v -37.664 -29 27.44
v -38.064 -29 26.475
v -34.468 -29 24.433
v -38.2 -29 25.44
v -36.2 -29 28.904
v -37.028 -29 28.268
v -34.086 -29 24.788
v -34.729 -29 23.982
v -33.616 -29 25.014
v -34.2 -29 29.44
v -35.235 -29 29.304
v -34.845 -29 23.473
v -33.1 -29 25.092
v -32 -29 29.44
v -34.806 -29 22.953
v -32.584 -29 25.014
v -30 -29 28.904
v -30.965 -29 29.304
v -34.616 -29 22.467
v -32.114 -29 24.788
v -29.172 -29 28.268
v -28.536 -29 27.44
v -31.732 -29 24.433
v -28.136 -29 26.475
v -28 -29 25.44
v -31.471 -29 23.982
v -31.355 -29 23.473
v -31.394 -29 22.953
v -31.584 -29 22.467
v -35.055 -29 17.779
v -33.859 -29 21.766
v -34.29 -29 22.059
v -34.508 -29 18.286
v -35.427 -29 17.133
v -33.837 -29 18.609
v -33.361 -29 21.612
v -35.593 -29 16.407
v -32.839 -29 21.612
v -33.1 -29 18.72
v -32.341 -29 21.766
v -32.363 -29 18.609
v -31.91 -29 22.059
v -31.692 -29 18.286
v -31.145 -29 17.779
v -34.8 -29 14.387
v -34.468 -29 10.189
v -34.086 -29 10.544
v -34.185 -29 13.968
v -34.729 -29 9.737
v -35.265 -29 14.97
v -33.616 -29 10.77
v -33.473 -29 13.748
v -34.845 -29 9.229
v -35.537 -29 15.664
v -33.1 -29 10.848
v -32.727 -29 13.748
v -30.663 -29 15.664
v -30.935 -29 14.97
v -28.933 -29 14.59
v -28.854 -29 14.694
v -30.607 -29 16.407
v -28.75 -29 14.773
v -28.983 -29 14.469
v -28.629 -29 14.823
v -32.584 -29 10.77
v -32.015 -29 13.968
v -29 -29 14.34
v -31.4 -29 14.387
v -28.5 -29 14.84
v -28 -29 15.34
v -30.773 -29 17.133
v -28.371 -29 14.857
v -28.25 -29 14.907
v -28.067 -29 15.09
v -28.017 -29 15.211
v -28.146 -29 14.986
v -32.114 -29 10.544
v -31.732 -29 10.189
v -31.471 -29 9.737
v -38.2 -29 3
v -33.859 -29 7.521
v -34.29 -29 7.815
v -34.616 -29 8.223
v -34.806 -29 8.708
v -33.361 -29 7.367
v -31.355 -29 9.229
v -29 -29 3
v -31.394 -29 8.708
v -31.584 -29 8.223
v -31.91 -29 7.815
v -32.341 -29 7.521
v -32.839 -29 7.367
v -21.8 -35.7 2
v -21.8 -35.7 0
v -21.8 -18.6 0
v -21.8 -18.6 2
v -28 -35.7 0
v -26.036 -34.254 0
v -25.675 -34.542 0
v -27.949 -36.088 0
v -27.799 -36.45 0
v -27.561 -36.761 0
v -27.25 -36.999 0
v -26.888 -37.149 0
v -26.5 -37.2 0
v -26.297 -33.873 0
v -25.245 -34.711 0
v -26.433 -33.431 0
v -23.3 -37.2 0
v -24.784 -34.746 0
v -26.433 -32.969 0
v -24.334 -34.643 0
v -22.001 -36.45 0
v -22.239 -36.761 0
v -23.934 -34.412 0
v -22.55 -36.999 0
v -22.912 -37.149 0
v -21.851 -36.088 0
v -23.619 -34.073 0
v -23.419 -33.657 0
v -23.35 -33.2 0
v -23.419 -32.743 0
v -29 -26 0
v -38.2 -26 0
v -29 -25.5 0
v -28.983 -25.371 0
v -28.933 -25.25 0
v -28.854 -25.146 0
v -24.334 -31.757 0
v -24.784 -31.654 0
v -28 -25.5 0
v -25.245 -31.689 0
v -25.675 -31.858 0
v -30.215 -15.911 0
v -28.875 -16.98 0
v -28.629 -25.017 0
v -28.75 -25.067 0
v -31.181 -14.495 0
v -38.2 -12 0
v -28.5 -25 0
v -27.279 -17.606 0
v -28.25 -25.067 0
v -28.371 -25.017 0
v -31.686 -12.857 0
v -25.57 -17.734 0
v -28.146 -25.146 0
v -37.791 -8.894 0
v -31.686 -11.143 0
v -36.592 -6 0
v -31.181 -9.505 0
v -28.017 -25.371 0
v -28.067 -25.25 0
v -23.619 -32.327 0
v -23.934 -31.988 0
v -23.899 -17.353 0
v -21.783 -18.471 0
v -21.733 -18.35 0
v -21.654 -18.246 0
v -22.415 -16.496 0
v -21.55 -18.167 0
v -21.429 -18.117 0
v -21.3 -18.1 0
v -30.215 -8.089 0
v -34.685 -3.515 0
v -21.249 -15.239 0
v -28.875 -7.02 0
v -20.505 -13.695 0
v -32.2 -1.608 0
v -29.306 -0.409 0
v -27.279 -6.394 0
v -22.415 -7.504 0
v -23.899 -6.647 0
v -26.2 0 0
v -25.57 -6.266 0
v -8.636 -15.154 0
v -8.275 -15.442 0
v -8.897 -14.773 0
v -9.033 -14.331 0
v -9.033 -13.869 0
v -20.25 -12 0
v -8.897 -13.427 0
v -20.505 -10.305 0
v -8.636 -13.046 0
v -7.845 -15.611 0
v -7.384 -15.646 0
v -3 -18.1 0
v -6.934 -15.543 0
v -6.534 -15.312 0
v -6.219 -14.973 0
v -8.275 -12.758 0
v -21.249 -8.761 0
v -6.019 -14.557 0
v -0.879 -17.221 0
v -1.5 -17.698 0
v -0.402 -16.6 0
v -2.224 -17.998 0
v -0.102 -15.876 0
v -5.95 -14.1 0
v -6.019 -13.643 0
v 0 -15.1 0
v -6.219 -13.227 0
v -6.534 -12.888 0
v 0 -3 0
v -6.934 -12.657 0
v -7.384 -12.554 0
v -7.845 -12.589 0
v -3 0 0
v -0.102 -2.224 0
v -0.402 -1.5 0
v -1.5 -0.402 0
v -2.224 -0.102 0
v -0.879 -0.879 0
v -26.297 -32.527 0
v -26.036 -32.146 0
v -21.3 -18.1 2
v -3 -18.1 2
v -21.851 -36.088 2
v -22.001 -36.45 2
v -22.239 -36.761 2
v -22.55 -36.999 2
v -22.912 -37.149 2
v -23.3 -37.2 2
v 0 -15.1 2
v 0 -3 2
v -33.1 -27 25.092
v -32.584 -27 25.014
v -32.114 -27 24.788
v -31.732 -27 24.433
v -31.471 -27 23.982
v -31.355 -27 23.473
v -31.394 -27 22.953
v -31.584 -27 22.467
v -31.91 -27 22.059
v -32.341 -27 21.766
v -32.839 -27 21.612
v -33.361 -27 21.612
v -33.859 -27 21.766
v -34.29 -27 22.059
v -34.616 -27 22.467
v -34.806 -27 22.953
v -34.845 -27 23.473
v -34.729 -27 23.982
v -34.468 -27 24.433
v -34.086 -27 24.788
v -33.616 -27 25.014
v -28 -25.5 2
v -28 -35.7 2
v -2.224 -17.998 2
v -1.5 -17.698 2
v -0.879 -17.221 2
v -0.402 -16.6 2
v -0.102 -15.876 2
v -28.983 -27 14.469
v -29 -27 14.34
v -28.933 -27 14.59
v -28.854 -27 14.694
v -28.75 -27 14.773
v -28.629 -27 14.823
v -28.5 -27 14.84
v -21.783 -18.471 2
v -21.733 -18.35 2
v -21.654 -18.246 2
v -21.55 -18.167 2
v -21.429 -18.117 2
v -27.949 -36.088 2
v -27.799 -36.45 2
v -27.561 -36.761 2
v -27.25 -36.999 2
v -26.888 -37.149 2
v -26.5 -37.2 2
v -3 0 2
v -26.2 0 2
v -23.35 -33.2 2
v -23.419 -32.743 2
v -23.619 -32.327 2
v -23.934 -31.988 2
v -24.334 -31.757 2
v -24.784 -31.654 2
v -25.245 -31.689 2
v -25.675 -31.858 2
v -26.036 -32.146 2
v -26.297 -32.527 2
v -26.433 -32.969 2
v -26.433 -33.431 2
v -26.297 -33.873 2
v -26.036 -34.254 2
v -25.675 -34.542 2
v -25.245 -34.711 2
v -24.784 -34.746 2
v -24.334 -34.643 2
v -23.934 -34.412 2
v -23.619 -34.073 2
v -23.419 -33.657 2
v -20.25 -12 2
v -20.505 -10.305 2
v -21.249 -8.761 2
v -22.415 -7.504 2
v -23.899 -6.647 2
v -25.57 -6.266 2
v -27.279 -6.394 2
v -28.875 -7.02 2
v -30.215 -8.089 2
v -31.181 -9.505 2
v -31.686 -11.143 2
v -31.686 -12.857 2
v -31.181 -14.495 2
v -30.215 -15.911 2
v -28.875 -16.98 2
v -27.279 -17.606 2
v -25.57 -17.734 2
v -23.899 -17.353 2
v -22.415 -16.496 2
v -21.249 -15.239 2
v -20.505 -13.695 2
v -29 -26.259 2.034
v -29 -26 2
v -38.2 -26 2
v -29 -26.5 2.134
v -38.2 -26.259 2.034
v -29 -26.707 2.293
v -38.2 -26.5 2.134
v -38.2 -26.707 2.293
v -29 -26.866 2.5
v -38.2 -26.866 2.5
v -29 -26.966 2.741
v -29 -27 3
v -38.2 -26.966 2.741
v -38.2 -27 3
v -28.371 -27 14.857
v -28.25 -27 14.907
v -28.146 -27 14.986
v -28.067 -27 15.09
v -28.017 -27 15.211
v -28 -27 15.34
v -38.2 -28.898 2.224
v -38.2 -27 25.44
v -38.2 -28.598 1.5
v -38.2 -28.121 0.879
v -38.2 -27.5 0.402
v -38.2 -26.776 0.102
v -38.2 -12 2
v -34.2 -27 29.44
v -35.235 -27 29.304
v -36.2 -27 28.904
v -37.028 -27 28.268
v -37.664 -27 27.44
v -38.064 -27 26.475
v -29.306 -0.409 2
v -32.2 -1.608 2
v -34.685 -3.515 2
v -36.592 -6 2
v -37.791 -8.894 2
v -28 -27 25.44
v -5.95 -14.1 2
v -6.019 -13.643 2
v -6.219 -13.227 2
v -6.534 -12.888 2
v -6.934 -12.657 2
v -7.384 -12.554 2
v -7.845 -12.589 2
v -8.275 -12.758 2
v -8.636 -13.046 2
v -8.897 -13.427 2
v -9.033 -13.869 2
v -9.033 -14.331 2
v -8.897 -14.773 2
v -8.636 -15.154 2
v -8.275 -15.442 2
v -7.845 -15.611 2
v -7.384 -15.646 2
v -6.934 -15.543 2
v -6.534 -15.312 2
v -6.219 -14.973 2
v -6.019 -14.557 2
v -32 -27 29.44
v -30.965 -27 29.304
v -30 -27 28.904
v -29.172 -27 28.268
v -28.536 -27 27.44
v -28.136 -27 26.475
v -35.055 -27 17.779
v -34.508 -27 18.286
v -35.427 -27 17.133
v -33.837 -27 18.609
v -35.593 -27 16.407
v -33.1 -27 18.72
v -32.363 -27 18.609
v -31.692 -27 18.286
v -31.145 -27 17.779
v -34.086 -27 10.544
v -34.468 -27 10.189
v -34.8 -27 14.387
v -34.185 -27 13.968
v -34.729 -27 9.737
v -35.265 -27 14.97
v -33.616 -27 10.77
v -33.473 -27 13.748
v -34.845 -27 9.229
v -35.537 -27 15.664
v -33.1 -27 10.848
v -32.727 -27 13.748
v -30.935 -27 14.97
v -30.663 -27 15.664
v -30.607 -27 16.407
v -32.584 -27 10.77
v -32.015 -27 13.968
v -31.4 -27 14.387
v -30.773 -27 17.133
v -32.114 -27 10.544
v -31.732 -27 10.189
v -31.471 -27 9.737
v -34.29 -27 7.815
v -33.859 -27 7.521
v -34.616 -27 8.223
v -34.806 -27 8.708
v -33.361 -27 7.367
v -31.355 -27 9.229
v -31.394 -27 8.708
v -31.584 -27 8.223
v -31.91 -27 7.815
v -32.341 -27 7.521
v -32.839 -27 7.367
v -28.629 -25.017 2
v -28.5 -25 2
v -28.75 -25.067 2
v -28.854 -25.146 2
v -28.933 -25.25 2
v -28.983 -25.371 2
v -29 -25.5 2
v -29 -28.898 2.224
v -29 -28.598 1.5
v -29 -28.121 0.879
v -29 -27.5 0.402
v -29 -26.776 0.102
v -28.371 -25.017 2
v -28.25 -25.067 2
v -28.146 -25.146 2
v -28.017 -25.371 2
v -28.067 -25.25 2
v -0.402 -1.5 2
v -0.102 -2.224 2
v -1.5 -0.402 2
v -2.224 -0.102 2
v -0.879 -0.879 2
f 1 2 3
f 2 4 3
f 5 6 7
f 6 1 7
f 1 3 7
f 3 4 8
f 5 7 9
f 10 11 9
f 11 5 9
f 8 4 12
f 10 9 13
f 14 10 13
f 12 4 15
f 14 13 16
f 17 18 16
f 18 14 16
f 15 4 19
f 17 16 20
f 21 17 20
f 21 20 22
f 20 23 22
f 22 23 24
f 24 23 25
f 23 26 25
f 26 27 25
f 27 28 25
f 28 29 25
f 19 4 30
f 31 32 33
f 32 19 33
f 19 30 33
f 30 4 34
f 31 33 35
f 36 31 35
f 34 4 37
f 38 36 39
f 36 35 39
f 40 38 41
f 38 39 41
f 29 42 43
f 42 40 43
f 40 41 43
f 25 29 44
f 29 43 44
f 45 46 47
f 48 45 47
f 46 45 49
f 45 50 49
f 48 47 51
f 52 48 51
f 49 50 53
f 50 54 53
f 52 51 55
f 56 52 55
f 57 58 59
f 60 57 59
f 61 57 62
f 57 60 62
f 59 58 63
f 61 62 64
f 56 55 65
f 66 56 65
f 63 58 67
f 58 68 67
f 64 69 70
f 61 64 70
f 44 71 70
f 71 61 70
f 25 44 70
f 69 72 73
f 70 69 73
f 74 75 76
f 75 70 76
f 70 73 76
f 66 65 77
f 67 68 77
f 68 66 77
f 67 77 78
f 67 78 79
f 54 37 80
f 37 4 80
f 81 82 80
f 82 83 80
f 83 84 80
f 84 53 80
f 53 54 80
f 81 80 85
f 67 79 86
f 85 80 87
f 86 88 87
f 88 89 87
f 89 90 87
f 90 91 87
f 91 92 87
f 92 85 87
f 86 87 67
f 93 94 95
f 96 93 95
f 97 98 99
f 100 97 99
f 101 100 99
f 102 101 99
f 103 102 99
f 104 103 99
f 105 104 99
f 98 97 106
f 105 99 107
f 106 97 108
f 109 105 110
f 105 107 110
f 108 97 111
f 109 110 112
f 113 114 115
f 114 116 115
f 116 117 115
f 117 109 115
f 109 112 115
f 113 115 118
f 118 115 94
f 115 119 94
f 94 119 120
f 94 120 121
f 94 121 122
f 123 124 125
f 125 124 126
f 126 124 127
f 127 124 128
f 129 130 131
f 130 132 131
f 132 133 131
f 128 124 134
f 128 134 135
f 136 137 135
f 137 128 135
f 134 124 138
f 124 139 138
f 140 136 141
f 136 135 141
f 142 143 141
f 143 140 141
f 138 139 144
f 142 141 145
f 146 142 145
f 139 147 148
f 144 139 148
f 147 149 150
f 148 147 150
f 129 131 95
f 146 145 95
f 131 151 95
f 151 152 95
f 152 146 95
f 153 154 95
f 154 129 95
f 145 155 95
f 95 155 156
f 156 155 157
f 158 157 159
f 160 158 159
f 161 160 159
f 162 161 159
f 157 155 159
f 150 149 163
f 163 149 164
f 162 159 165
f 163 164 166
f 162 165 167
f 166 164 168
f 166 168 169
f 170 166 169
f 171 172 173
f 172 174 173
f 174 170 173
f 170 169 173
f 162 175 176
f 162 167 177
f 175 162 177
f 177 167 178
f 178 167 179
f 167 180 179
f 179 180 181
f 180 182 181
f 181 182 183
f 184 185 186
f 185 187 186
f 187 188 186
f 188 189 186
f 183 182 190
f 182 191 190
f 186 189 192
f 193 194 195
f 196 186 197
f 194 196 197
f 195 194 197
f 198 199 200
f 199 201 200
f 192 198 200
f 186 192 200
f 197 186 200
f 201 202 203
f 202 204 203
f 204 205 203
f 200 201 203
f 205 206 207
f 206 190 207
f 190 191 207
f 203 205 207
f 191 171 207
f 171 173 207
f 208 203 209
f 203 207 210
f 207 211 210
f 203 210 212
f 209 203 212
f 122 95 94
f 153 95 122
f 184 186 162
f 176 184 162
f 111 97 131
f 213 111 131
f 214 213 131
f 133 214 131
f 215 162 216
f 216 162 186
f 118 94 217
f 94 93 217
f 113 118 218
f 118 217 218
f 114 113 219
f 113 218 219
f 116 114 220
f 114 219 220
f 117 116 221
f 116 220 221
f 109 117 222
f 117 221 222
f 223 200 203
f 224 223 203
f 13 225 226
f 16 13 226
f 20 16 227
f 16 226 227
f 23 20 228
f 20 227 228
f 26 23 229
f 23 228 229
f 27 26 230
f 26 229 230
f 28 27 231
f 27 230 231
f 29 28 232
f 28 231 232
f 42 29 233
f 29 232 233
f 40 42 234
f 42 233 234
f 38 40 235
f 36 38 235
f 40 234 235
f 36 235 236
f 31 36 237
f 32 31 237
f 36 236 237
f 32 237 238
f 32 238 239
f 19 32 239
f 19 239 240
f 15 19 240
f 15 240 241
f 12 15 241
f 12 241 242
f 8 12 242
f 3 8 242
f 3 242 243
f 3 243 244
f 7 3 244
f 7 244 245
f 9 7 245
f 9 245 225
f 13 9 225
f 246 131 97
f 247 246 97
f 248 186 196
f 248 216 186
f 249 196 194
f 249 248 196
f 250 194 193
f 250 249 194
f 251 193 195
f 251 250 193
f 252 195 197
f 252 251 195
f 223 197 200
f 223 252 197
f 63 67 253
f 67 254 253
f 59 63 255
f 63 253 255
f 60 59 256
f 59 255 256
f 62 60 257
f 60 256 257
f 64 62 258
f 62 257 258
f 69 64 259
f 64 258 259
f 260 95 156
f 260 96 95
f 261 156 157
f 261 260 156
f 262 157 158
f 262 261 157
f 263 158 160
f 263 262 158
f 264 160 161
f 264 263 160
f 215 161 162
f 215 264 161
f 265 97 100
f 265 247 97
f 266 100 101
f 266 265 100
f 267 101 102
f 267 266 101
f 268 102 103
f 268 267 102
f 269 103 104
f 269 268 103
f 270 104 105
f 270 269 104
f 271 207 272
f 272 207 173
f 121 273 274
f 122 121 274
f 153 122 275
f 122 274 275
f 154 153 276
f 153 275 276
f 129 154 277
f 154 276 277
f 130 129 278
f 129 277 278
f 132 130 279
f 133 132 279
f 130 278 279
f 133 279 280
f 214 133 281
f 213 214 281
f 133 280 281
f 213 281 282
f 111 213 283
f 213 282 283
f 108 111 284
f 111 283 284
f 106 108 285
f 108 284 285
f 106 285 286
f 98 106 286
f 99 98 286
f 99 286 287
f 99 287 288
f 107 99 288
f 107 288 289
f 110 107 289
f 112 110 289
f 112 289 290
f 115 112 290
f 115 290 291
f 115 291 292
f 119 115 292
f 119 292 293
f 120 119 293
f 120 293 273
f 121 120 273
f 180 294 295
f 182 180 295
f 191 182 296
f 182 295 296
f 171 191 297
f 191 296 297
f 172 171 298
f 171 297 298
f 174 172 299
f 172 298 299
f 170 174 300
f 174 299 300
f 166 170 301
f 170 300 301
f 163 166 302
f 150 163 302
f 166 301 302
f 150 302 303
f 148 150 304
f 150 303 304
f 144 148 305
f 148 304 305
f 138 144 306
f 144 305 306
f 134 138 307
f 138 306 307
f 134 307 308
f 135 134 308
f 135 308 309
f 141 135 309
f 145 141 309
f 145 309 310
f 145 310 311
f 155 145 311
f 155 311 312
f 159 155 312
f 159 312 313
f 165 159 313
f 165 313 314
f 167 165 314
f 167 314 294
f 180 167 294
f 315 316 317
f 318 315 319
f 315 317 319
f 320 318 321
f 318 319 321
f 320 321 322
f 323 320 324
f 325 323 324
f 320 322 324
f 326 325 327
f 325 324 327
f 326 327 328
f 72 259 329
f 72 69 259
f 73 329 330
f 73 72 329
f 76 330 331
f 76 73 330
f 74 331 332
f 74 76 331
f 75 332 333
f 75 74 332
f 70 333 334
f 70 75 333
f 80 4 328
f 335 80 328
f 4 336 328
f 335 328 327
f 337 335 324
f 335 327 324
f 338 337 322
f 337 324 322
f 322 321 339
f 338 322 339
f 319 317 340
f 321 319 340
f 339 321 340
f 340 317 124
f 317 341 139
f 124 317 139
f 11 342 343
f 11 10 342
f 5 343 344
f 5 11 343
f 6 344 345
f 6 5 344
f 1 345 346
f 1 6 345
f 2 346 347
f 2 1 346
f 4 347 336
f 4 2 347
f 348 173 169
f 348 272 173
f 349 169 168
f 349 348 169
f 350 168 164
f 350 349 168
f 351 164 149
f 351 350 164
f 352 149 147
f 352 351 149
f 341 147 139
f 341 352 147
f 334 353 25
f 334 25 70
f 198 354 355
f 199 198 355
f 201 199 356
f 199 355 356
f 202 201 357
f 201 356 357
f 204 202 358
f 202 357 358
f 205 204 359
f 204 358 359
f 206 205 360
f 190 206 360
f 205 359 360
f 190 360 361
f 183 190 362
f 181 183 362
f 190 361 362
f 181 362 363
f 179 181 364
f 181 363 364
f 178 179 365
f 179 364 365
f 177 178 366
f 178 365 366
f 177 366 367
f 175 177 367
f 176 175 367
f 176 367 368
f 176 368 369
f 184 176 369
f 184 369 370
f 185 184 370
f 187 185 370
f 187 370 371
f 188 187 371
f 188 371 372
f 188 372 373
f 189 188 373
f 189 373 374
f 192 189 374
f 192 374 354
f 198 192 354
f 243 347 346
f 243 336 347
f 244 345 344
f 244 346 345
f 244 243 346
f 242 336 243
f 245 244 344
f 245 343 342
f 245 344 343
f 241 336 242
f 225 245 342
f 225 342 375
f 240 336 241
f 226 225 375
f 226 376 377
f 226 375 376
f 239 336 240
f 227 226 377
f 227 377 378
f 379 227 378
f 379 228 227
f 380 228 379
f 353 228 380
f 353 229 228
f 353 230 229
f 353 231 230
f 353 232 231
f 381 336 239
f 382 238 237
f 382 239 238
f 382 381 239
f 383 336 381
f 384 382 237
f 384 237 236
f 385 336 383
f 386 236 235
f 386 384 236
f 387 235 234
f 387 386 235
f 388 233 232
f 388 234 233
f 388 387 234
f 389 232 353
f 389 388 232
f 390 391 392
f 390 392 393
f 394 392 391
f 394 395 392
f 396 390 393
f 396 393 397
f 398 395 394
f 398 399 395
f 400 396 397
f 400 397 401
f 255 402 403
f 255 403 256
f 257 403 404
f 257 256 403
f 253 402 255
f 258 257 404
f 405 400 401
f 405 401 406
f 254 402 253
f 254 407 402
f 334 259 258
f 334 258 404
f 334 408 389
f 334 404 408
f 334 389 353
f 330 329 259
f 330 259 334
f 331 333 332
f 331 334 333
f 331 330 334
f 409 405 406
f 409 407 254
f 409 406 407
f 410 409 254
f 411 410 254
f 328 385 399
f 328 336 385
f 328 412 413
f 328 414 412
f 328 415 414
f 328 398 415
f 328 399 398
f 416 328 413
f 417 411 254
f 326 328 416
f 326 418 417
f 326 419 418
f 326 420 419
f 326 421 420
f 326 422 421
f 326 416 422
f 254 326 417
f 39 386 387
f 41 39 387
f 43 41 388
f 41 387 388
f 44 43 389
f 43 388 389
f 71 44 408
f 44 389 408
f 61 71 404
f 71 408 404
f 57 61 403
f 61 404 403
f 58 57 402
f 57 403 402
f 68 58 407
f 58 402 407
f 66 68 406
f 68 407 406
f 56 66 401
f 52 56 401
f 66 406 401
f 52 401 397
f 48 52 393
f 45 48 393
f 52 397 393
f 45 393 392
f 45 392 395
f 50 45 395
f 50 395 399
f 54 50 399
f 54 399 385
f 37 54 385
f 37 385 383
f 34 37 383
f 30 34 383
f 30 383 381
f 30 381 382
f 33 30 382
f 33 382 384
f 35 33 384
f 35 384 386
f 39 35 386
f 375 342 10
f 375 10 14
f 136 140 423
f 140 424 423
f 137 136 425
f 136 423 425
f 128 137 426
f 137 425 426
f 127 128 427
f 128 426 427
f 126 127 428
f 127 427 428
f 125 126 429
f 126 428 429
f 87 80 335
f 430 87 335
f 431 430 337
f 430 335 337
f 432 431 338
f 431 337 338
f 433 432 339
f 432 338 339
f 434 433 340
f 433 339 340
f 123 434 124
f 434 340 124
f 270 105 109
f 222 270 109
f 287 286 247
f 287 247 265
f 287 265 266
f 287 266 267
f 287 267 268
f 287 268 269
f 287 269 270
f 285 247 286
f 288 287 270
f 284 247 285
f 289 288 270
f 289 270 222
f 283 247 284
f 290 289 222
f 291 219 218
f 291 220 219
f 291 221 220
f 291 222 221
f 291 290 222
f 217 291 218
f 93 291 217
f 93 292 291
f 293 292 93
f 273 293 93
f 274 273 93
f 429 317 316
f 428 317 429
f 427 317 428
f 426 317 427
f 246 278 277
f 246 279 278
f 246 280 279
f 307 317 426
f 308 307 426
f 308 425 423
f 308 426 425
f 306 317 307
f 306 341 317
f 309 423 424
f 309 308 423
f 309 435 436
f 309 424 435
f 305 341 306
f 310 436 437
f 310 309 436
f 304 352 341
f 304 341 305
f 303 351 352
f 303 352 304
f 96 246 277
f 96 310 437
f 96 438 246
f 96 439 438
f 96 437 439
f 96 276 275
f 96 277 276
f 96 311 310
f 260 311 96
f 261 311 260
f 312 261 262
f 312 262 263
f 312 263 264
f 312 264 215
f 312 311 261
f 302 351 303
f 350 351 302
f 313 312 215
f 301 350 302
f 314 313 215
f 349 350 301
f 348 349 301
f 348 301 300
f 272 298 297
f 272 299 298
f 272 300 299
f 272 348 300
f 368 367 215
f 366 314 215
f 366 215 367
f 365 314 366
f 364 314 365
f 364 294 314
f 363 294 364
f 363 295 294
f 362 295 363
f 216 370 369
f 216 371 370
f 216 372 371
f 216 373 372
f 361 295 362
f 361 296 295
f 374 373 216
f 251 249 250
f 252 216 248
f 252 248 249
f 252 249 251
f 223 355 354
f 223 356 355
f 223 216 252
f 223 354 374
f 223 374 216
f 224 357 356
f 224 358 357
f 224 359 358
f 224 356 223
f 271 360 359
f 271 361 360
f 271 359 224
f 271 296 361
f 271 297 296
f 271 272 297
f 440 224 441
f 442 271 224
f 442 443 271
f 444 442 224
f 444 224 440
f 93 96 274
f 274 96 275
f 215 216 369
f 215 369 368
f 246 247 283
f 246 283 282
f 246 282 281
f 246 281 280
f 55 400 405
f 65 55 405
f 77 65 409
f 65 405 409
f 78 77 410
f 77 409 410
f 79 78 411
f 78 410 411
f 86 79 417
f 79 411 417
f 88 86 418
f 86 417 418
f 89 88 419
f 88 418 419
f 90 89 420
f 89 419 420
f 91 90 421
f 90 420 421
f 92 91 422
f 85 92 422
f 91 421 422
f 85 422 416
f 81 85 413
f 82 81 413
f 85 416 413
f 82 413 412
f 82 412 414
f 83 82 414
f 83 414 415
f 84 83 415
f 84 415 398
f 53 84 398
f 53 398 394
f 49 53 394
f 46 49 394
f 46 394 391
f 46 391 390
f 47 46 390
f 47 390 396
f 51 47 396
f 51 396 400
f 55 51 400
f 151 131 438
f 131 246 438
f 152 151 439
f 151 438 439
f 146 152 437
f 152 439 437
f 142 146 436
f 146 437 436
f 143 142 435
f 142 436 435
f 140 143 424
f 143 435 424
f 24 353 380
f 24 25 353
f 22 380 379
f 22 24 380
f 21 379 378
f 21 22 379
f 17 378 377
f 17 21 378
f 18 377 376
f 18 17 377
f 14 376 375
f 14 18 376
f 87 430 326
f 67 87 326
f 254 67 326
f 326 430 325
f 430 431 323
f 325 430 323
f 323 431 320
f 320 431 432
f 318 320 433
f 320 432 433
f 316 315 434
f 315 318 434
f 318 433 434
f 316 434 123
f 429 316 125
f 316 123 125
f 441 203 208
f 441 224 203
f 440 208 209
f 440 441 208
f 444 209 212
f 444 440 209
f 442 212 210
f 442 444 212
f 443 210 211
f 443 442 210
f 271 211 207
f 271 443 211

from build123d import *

# Parameters (mm, degrees)
BOSS_EXTRUDE1_DEPTH = 2
BOSS_EXTRUDE2_DEPTH = 9.2
SKETCH3_W           = 9.2
SKETCH3_H           = 2
BOSS_EXTRUDE3_DEPTH = 11.84
SKETCH4_W           = 10.2
SKETCH4_H           = 14.6
BOSS_EXTRUDE4_DEPTH = 2
FILLET1_R           = 3
FILLET2_R           = 12
SKETCH5_R           = 1.55
CUT_EXTRUDE1_DEPTH  = 60.966937557
FILLET3_R           = 1.5
FILLET4_R           = 0.5
FILLET5_R           = 0.5
FILLET6_R           = 4
FILLET7_R           = 0.5
SKETCH6_R           = 5.75
CUT_EXTRUDE2_DEPTH  = 60.966937557
SKETCH7_R           = 1.75
SKETCH7_R_2         = 2.5
CUT_EXTRUDE3_DEPTH  = 56.271634678


with BuildPart() as part:
    # Sketch1 → Boss-Extrude1 (new body)
    with BuildSketch(Plane.XY):
        Polygon((0, 0), (-38.2, 0), (-38.2, -26), (-29, -26), (-29, -25), (-28, -25), (-28, -37.2), (-21.8, -37.2), (-21.8, -18.1), (0, -18.1), align=None)
    extrude(amount=BOSS_EXTRUDE1_DEPTH)

    # Sketch2 → Boss-Extrude2 (add)
    with BuildSketch(Plane.ZY.offset(38.2)):
        with BuildLine():
            Line((0, -26), (2, -26))
            ThreePointArc((2, -26), (2.292893219, -26.707106781), (3, -27))
            Line((3, -27), (3, -29))
            ThreePointArc((3, -29), (0.878679656, -28.121320344), (0, -26))
        make_face()
    extrude(amount=-BOSS_EXTRUDE2_DEPTH)

    # Sketch3 → Boss-Extrude3 (add)
    with BuildSketch(Plane.XY.offset(3)):
        with Locations((-33.6, -28)):
            Rectangle(SKETCH3_W, SKETCH3_H)
    extrude(amount=BOSS_EXTRUDE3_DEPTH)

    # Sketch4 → Boss-Extrude4 (add)
    with BuildSketch(Plane(origin=(0, -27, 0), x_dir=(1, 0, 0), z_dir=(0, 1, 0))):
        with Locations((-33.1, -22.14)):
            Rectangle(SKETCH4_W, SKETCH4_H)
    extrude(amount=-BOSS_EXTRUDE4_DEPTH)

    # Fillet1
    fillet1_edges = [part.edges().sort_by_distance(p)[0] for p in [
        (0, -18.1, 1),
        (0, 0, 1),
    ]]
    fillet(fillet1_edges, radius=FILLET1_R)

    # Fillet2
    fillet2_edges = [part.edges().sort_by_distance(p)[0] for p in [
        (-38.2, 0, 1),
    ]]
    fillet(fillet2_edges, radius=FILLET2_R)

    # Sketch5 → Cut-Extrude1 (cut, through all)
    with BuildSketch(Plane.XY.offset(2)):
        with Locations((-7.5, -14.1)):
            Circle(SKETCH5_R)
        with Locations((-24.9, -33.2)):
            Circle(SKETCH5_R)
    extrude(amount=-CUT_EXTRUDE1_DEPTH, mode=Mode.SUBTRACT)

    # Fillet3
    fillet3_edges = [part.edges().sort_by_distance(p)[0] for p in [
        (-21.8, -37.2, 1),
        (-28, -37.2, 1),
    ]]
    fillet(fillet3_edges, radius=FILLET3_R)

    # Fillet4
    fillet4_edges = [part.edges().sort_by_distance(p)[0] for p in [
        (-28, -25, 1),
        (-29, -25, 1),
    ]]
    fillet(fillet4_edges, radius=FILLET4_R - 0.0001)  # a hair under: the kernel refuses the full size

    # Fillet5
    fillet5_edges = [part.edges().sort_by_distance(p)[0] for p in [
        (-29, -28, 14.84),
    ]]
    fillet(fillet5_edges, radius=FILLET5_R)
    fillet5_2_edges = [part.edges().sort_by_distance(p)[0] for p in [
        (-28, -28, 14.84),
    ]]
    fillet(fillet5_2_edges, radius=FILLET5_R - 0.0001)  # a hair under: the kernel refuses the full size

    # Fillet6
    fillet6_edges = [part.edges().sort_by_distance(p)[0] for p in [
        (-38.2, -28, 29.44),
        (-28, -28, 29.44),
    ]]
    fillet(fillet6_edges, radius=FILLET6_R)

    # Fillet7
    fillet7_edges = [part.edges().sort_by_distance(p)[0] for p in [
        (-21.8, -18.1, 1),
    ]]
    fillet(fillet7_edges, radius=FILLET7_R)

    # Sketch6 → Cut-Extrude2 (cut, through all)
    with BuildSketch(Plane.XY.offset(2)):
        with Locations((-26, -12)):
            Circle(SKETCH6_R)
    extrude(amount=-CUT_EXTRUDE2_DEPTH, mode=Mode.SUBTRACT)

    # Sketch7 → Cut-Extrude3 (cut, through all)
    with BuildSketch(Plane(origin=(0, -27, 0), x_dir=(1, 0, 0), z_dir=(0, 1, 0))):
        with Locations(Location((-33.1, -23.342208336, 0), (0, 0, 270))):
            Circle(SKETCH7_R)
        with Locations(Location((-33.1, -9.097791664, 0), (0, 0, 270))):
            Circle(SKETCH7_R)
        with Locations(Location((-33.1, -16.22, 0), (0, 0, 270))):
            Circle(SKETCH7_R_2)
    extrude(amount=-CUT_EXTRUDE3_DEPTH, mode=Mode.SUBTRACT)


solid = part.part
